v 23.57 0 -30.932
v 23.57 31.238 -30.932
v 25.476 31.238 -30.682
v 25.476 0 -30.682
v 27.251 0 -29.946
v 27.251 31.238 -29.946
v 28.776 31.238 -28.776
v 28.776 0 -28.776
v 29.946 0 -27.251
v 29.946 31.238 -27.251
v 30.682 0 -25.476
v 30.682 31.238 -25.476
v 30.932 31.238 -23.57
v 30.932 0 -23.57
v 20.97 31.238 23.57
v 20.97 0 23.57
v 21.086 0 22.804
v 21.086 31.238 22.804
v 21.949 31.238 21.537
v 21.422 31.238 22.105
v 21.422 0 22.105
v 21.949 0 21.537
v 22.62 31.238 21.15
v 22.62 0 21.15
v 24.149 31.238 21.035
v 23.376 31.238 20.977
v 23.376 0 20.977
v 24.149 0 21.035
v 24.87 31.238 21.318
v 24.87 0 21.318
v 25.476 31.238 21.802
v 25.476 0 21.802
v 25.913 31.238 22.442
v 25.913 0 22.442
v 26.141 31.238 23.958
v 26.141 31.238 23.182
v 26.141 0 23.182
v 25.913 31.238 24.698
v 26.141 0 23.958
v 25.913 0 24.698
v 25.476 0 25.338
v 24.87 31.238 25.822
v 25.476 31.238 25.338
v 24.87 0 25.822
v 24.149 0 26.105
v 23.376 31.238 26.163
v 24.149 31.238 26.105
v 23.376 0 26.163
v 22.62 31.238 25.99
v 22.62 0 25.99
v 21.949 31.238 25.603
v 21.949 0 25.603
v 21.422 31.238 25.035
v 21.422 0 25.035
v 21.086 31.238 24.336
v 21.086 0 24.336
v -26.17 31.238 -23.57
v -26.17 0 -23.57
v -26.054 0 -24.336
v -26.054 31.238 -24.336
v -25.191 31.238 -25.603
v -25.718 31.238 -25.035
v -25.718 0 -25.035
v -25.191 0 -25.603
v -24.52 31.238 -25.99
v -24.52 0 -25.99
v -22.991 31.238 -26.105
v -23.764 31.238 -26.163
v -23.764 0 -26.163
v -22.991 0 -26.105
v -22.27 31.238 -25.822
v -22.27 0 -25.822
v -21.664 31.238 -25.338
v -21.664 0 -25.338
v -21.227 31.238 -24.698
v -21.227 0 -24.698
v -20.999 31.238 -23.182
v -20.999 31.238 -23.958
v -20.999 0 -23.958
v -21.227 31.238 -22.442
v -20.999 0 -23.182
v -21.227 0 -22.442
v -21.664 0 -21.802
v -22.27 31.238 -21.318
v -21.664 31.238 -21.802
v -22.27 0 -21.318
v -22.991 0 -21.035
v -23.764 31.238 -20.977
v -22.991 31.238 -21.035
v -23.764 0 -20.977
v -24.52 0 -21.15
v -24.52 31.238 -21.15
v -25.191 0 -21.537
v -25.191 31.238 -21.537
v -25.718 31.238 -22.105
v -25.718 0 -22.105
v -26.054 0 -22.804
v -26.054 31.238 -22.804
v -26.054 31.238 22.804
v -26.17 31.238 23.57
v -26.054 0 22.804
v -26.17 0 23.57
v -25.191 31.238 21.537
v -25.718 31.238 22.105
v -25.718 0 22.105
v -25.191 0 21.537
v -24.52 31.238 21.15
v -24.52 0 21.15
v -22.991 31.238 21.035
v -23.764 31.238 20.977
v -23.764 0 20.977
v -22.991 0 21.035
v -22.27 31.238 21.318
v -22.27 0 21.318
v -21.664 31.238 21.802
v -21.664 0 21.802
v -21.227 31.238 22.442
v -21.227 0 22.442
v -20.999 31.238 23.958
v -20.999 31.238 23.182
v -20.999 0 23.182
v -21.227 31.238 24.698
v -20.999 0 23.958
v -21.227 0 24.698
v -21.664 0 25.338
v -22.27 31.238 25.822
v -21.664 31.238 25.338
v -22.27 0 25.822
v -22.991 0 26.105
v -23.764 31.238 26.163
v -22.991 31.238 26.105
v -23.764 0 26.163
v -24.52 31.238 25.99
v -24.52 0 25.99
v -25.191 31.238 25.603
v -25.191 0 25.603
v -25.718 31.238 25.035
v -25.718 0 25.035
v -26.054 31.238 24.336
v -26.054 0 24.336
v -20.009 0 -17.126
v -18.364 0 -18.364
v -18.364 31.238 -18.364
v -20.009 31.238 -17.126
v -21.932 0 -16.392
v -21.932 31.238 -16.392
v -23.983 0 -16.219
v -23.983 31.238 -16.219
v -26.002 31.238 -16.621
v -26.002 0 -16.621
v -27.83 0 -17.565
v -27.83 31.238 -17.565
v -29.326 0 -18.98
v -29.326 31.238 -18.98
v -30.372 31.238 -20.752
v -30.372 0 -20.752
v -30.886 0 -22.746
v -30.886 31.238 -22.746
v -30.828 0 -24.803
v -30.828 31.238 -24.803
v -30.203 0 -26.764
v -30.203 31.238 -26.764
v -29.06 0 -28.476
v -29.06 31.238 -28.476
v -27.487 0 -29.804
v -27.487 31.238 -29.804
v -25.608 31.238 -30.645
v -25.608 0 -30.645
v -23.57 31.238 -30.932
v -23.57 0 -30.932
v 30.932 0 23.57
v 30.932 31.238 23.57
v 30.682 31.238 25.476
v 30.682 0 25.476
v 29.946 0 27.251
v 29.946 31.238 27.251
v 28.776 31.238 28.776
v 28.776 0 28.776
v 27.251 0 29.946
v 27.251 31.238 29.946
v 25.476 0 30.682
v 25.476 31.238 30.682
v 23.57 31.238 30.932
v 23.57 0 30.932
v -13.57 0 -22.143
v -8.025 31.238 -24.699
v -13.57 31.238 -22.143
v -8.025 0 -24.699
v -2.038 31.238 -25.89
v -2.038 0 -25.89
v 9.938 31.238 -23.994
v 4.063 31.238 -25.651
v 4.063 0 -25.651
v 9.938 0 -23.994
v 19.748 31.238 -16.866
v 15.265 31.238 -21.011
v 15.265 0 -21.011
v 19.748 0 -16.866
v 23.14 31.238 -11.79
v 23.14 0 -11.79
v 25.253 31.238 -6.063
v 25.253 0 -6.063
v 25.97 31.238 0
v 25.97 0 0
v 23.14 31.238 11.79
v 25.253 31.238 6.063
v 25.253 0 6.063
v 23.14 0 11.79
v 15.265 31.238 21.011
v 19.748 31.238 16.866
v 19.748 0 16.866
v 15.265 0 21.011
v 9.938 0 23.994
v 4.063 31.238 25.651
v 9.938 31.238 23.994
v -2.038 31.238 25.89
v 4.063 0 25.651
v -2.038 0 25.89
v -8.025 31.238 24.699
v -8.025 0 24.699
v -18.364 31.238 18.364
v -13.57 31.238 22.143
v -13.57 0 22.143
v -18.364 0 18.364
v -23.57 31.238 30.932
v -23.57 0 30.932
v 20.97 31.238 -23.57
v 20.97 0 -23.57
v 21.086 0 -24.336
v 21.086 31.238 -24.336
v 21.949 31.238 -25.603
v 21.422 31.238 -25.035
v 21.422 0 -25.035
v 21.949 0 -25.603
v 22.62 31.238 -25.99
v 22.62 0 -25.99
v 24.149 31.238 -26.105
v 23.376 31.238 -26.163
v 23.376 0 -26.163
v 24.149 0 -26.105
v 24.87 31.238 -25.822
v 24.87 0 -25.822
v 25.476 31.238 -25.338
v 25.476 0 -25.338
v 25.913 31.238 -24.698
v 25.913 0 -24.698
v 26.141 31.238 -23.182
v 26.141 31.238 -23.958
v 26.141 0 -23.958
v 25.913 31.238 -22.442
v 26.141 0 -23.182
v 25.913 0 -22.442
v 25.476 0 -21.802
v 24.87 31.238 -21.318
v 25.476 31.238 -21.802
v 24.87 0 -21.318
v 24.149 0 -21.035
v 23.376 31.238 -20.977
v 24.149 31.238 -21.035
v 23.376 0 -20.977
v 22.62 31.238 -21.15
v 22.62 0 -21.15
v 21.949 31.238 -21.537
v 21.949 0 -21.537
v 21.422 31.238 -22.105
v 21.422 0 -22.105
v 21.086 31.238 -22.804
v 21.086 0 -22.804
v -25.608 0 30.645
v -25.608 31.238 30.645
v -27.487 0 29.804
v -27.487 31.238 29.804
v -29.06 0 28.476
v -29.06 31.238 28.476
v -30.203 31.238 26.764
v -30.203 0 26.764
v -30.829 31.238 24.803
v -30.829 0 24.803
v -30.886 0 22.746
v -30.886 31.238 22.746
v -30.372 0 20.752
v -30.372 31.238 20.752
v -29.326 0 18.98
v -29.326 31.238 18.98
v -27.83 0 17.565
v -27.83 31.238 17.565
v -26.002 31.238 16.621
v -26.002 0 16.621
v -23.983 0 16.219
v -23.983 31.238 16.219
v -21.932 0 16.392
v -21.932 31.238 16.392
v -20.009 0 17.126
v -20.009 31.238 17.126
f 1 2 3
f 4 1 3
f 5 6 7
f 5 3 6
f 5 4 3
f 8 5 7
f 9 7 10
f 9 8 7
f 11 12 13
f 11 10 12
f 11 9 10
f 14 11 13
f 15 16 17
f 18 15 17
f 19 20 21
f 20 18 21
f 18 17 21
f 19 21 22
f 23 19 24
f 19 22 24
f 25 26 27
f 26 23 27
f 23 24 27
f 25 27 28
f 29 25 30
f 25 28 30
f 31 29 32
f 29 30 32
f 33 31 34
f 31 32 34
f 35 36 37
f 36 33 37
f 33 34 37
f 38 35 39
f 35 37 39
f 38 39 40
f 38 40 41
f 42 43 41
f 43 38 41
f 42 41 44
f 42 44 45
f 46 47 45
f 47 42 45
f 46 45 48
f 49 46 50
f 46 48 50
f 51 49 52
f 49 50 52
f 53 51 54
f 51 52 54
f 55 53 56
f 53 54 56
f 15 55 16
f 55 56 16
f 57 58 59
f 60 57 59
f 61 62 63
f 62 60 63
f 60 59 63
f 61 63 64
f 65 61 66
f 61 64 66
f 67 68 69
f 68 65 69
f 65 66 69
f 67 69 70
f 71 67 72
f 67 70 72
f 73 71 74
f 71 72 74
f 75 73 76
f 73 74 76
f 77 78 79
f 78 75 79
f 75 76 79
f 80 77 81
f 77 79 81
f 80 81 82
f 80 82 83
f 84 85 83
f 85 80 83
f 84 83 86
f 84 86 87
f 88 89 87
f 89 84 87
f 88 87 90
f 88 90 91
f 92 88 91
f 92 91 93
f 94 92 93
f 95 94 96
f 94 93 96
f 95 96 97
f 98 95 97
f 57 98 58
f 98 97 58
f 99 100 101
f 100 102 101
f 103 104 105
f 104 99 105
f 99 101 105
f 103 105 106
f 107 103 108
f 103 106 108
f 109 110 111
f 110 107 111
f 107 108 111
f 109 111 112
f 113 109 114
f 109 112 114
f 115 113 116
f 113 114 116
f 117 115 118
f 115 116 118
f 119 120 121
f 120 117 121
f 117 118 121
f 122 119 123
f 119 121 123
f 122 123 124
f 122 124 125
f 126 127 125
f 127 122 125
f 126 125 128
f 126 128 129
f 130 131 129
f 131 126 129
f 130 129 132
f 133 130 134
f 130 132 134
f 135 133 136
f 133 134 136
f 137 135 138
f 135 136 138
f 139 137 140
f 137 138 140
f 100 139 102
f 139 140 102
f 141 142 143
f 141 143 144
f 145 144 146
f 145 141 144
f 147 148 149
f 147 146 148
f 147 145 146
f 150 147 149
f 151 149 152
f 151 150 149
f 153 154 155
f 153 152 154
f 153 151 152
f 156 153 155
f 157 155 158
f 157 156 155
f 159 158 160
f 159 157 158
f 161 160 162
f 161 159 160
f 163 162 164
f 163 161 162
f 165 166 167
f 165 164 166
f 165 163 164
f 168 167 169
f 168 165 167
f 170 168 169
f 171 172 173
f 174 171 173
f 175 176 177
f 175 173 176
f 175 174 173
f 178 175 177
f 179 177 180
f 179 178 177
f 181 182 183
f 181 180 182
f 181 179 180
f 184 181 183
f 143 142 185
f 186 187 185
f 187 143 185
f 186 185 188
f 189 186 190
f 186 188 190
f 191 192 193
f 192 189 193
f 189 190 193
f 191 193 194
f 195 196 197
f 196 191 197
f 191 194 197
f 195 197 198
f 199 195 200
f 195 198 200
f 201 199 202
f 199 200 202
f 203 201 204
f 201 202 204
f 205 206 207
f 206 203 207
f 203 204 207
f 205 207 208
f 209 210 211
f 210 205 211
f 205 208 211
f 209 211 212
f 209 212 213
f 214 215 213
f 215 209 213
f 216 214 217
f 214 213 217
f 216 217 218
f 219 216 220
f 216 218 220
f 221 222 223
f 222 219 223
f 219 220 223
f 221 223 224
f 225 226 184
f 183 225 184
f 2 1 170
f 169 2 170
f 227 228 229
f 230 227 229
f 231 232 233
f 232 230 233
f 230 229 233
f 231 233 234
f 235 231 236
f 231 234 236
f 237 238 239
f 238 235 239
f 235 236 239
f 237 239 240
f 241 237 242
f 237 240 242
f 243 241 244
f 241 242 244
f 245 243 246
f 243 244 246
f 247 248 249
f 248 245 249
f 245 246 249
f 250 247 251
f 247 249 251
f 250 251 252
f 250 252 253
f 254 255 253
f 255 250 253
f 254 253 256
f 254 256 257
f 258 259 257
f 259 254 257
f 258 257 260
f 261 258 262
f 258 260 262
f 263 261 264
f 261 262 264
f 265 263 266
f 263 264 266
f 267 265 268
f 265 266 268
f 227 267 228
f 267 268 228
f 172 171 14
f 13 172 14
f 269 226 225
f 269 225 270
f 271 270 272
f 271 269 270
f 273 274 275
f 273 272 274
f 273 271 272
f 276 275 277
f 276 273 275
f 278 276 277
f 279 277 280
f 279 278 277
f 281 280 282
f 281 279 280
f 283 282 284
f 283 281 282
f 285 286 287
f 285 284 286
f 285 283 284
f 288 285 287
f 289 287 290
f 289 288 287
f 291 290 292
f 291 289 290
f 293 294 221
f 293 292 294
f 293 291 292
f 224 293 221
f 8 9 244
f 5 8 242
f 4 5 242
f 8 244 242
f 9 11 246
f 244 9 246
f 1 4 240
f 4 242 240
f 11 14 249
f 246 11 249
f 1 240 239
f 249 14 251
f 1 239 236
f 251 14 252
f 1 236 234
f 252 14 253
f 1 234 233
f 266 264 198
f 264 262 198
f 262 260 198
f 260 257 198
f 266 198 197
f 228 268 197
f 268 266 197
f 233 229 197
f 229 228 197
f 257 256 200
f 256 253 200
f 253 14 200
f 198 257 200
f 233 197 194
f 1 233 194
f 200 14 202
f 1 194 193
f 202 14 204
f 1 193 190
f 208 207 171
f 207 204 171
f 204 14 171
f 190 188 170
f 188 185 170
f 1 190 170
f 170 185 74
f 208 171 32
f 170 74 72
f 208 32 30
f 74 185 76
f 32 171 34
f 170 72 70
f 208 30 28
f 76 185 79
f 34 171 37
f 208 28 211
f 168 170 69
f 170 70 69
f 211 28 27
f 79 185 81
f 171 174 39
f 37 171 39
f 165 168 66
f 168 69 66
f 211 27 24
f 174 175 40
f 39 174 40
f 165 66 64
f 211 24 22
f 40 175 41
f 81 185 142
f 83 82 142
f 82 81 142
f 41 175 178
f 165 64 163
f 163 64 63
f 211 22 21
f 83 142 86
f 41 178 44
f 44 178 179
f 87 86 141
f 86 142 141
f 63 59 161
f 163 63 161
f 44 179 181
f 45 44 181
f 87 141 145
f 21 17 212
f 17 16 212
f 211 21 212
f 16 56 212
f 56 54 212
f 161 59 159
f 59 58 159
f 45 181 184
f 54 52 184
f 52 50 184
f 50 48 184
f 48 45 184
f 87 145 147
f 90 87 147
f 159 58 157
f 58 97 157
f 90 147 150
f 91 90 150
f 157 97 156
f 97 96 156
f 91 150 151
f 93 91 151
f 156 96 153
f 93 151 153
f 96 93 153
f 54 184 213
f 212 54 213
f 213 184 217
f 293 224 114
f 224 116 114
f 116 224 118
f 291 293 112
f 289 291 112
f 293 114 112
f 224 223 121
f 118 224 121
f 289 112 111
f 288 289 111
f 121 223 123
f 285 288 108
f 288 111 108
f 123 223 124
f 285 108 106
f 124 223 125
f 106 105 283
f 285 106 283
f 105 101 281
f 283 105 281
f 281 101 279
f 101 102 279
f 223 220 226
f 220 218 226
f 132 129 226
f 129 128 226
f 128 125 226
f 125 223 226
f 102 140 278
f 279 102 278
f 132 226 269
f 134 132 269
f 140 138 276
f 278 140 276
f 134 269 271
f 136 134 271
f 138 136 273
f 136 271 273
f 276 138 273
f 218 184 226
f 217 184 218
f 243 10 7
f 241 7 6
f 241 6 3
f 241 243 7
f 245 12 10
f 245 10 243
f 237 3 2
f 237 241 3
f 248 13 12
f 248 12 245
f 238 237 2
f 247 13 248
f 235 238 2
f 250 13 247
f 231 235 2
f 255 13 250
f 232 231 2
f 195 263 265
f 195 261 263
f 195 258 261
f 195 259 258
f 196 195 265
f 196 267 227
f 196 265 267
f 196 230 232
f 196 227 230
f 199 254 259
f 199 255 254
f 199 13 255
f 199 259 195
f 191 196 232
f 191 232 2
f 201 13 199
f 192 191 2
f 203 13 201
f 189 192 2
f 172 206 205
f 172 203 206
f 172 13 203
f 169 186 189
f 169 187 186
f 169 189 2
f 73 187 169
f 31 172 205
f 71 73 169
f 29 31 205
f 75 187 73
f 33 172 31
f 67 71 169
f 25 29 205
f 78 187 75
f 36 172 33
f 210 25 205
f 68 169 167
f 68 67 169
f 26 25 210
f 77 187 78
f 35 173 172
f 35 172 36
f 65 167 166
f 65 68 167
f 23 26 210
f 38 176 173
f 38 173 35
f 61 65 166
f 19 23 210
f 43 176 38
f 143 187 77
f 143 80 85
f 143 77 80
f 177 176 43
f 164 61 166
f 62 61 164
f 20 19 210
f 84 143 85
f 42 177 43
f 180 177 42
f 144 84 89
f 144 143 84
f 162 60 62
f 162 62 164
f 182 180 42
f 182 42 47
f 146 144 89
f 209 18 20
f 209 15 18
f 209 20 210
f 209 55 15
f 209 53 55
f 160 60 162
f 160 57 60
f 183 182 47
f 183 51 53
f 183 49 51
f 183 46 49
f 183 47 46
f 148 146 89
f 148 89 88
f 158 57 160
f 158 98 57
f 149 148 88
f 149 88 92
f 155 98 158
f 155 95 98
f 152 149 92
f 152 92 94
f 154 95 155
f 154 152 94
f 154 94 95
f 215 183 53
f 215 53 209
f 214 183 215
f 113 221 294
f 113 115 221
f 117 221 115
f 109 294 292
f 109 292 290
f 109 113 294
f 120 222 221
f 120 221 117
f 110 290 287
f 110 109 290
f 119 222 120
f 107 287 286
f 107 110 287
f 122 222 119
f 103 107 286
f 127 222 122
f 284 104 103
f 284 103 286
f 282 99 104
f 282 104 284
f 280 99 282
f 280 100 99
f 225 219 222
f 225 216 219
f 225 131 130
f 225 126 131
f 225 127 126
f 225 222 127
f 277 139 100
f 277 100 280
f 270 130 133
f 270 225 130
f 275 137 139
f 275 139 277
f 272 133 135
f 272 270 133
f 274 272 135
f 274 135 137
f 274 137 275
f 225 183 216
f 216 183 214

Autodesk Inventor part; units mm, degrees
ref_plane "YZ Plane" through (0, 0, 0) normal (1, 0, 0) x (0, 1, 0)
ref_plane "XZ Plane" through (0, 0, 0) normal (0, 1, 0) x (-1, 0, 0)
ref_plane "XY Plane" through (0, 0, 0) normal (0, 0, 1) x (1, 0, 0)
sketch "Sketch1" plane through (0, 0, 0) normal (0, 1, 0) x (-1, 0, 0)
  circle A0 centre (0, 0) radius 8.0947
  circle A1 centre (23.57, 23.57) radius 2.6
  circle A2 centre (23.57, -23.57) radius 2.6
  circle A3 centre (-23.57, -23.57) radius 2.6
  circle A4 centre (-23.57, 23.57) radius 2.6
  circle A5 centre (23.57, 23.57) radius 7.3625 construction
  circle A6 centre (23.57, -23.57) radius 7.3625 construction
  circle A7 centre (-23.57, -23.57) radius 7.3625 construction
  circle A8 centre (-23.57, 23.57) radius 7.3625 construction
  line L0 (23.57, 30.9325) -> (-23.57, 30.9325)
  line L1 (-30.9325, 23.57) -> (-30.9325, -23.57)
  line L2 (-23.57, -30.9325) -> (23.57, -30.9325)
  arc A9 (18.3639, 18.3639) -> (23.57, 30.9325) centre (23.57, 23.57) ccw
  arc A10 (23.57, -30.9325) -> (18.3639, -18.3639) centre (23.57, -23.57) ccw
  circle A11 centre (0, 0) radius 25.9705 construction
  arc A12 (18.3639, 18.3639) -> (18.3639, -18.3639) centre (0, 0) ccw
  arc A13 (-23.57, 30.9325) -> (-30.9325, 23.57) centre (-23.57, 23.57) ccw
  arc A14 (-30.9325, -23.57) -> (-23.57, -30.9325) centre (-23.57, -23.57) ccw
  dimension "d0" = 16.1894
  dimension "d1" = 5.2
  dimension "d2" = 23.57
  dimension "d3" = 23.57
  dimension "d4" = 23.57
  dimension "d5" = 23.57
  dimension "d6" = 4.7625
extrude "Extrusion1" add sketch "Sketch1" along normal blind 31.2375 contours A9 A12 A10 L2 A14 L1 A13 L0
properties part number "CNC-009-XAxisNema23Spacer" material "ABS Plastic"
